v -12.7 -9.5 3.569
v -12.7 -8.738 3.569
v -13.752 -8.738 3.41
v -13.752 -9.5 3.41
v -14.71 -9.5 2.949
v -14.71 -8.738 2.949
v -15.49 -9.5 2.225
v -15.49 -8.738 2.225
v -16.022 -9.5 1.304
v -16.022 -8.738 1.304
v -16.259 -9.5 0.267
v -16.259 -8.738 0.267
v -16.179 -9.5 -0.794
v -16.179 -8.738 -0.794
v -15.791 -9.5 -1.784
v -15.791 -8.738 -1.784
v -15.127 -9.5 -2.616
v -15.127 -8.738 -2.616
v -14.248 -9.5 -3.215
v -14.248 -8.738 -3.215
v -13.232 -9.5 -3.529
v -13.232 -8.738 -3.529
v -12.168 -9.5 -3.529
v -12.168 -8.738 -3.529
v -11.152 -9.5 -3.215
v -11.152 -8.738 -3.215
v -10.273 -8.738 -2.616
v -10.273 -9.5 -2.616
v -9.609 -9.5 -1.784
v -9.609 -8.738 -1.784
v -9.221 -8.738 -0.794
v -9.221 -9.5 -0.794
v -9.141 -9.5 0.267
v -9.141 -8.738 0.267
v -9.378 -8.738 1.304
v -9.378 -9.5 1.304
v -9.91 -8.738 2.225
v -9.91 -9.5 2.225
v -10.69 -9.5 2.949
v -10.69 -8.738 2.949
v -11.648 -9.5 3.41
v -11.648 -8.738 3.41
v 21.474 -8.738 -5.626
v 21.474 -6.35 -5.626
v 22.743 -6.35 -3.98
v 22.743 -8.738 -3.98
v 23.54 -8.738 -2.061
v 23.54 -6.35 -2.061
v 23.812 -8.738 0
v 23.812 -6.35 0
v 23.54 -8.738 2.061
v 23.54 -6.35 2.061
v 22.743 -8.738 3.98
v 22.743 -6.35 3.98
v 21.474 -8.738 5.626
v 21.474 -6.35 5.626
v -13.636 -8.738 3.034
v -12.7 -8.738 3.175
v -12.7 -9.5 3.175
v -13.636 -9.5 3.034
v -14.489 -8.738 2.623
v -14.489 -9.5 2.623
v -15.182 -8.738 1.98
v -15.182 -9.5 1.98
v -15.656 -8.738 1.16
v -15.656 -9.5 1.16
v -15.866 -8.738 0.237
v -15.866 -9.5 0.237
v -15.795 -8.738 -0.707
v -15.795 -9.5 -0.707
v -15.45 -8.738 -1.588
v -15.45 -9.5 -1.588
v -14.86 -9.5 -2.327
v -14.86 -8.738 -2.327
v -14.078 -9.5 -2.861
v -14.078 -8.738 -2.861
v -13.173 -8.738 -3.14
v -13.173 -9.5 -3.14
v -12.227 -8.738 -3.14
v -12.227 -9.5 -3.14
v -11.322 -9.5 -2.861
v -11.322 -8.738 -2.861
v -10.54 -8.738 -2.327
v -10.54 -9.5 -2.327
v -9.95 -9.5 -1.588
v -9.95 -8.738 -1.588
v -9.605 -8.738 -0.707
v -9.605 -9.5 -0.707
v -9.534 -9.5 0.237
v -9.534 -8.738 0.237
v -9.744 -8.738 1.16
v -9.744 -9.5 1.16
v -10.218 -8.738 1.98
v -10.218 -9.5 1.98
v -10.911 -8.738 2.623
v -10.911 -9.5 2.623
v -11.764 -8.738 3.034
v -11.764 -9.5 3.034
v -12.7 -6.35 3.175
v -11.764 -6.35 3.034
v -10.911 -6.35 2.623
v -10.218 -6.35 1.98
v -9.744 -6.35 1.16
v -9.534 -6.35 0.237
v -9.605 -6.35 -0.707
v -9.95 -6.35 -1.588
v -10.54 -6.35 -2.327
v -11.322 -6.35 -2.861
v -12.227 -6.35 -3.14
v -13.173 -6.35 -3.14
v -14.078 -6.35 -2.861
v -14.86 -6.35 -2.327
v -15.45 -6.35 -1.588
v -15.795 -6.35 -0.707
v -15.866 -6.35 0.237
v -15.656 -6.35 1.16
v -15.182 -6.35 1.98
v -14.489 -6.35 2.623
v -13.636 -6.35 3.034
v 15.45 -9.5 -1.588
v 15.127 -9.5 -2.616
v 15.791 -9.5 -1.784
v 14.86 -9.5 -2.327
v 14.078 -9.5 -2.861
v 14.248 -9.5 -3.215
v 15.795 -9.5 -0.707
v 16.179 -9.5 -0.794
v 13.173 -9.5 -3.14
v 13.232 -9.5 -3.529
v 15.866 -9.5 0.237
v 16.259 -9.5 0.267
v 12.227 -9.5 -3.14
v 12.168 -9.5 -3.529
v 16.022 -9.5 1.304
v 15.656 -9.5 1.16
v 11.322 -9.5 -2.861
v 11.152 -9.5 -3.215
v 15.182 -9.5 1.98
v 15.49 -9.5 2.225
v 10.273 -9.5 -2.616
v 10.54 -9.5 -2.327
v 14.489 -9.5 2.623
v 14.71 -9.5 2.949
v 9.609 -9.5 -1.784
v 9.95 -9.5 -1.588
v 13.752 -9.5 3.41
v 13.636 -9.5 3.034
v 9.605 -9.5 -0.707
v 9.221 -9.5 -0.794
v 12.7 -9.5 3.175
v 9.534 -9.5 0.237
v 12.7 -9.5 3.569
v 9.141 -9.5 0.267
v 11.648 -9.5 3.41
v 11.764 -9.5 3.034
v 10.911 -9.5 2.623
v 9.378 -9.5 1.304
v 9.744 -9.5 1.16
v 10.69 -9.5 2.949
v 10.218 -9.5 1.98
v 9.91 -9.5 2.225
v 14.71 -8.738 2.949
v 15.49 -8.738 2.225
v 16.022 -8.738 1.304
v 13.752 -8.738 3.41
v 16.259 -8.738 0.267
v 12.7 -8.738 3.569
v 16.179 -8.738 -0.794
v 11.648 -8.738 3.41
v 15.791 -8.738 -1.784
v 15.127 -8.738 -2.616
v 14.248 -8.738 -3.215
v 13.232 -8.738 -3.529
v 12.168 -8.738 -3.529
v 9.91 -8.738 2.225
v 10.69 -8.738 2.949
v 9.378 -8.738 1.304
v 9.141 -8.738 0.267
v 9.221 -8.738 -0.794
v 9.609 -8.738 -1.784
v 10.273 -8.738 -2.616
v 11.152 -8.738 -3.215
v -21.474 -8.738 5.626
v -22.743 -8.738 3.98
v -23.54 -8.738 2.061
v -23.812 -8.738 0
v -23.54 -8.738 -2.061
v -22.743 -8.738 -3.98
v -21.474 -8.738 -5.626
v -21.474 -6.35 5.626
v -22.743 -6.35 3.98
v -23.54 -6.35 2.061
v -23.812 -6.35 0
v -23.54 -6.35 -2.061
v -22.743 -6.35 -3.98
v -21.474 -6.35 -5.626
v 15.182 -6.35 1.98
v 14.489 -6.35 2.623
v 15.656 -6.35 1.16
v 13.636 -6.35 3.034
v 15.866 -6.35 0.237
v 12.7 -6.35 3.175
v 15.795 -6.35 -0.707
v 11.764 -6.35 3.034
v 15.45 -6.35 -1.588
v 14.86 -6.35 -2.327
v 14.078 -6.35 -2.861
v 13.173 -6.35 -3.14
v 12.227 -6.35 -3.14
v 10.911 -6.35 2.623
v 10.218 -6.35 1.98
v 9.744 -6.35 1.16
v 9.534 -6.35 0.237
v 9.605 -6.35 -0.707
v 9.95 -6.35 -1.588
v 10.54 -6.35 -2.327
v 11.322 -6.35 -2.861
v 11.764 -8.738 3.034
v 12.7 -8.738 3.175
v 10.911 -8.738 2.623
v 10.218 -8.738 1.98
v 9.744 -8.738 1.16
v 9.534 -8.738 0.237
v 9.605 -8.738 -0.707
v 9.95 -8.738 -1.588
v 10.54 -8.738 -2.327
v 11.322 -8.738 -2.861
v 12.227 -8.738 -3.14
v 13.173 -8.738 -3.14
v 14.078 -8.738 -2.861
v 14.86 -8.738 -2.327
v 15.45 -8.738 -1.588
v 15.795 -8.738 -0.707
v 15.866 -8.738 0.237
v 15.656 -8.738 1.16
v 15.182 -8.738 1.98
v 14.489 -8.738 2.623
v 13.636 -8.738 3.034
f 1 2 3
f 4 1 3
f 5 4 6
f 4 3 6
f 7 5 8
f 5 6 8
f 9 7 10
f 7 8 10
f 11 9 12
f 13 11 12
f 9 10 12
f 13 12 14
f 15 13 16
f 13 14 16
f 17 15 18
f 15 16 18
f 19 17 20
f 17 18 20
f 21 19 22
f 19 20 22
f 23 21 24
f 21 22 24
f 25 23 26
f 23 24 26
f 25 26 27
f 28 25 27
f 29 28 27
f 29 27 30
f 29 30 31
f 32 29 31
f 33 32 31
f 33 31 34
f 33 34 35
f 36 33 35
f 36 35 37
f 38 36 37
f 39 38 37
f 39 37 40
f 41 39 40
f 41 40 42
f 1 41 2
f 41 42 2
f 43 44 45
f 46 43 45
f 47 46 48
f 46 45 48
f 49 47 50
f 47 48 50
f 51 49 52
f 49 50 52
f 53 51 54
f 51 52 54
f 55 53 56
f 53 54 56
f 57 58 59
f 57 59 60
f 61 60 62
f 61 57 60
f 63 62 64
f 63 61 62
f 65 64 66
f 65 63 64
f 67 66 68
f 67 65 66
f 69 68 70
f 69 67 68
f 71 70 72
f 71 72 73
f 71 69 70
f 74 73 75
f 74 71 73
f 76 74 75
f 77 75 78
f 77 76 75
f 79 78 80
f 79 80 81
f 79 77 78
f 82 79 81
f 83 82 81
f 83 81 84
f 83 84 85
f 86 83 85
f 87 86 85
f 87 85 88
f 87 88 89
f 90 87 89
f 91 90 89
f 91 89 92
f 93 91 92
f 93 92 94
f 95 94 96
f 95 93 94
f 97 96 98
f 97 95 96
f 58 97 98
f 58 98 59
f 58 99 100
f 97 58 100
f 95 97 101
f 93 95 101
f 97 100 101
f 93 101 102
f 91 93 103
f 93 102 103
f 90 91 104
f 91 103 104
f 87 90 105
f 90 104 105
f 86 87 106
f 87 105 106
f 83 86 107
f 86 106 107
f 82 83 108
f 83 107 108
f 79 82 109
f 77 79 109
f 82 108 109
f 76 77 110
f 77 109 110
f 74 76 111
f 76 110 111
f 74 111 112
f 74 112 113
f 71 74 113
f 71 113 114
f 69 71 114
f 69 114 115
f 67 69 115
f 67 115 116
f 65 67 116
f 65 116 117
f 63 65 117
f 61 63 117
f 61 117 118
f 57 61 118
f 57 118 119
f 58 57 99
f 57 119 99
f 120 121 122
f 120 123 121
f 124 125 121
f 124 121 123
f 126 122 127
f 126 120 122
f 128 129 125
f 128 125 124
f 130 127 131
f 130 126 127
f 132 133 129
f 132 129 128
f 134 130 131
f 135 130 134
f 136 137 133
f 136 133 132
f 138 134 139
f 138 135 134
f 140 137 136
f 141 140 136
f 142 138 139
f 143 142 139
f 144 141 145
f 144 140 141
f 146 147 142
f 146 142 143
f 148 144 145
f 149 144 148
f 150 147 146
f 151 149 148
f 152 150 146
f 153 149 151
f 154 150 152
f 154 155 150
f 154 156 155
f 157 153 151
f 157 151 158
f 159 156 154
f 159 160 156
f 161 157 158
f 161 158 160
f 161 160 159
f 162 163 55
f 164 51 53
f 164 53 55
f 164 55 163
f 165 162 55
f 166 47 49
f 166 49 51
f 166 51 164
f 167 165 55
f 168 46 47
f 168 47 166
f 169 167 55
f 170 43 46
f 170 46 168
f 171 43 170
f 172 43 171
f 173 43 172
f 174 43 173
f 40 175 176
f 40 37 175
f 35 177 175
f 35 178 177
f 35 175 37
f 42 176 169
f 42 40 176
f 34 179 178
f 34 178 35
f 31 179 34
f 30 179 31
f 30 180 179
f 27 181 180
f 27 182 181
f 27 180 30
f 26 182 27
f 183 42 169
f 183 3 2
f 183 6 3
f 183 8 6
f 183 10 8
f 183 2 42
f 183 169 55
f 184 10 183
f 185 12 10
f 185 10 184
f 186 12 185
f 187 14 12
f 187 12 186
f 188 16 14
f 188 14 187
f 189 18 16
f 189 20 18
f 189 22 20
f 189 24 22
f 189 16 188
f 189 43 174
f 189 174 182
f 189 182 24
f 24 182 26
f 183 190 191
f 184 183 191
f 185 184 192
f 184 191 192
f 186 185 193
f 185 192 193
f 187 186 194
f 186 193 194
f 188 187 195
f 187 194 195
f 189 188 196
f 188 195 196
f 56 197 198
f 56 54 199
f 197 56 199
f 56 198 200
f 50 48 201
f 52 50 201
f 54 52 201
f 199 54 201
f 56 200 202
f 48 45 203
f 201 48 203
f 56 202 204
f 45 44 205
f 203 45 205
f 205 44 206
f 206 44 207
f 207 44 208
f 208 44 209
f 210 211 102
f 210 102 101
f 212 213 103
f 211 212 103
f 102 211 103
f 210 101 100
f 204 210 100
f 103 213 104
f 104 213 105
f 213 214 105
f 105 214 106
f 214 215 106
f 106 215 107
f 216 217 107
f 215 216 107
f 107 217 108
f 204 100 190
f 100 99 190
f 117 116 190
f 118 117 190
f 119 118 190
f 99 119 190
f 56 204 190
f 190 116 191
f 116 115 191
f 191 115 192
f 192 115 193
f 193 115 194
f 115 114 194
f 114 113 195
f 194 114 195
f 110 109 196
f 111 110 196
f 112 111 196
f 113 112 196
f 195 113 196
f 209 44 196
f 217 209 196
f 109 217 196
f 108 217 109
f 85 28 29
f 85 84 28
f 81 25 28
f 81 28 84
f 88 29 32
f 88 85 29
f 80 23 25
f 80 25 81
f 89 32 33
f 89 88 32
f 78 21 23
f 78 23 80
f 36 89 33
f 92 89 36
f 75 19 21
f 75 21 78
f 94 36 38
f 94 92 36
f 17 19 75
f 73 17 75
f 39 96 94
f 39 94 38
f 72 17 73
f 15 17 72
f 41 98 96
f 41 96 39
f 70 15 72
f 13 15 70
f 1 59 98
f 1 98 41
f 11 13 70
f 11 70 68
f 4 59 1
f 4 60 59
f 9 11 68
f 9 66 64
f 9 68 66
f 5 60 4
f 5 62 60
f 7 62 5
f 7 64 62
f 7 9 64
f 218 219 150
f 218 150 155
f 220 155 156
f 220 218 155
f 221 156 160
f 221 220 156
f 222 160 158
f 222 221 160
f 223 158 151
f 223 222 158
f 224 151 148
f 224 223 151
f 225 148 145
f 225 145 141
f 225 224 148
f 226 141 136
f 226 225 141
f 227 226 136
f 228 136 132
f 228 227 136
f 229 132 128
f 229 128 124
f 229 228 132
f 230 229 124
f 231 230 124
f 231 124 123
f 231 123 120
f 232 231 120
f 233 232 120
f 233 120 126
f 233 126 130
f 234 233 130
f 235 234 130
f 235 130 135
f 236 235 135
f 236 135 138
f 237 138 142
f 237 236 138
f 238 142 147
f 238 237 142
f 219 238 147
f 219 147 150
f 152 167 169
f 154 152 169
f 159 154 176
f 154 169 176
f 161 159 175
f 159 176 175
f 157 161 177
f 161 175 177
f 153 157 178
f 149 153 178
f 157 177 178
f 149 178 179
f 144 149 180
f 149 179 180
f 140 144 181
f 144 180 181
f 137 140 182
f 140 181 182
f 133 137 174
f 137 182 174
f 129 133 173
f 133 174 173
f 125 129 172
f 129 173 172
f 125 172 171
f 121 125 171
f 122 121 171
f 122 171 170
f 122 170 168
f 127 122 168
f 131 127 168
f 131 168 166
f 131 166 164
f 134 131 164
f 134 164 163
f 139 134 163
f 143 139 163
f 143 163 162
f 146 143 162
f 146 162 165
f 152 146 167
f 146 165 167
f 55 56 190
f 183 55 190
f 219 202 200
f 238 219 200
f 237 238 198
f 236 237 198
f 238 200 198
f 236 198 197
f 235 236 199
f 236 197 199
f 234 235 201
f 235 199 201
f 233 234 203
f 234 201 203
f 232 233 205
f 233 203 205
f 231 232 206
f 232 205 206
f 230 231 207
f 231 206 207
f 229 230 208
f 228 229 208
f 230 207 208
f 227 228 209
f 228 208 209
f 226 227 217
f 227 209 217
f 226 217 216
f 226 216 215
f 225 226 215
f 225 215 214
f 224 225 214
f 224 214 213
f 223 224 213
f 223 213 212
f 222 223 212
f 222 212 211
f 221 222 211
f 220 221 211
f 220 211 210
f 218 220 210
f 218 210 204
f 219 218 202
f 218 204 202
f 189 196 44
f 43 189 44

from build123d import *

# Parameters (mm, degrees)
SKETCH1_R           = 3.175
BOSS_EXTRUDE1_DEPTH = 12.7
CUT_SWEEP1_PITCH    = 1.27
SKETCH4_OUTSIDE_W   = 14
SKETCH4_OUTSIDE_H   = 14
SKETCH4_OUTSIDE_R   = 2.21262927
CUT_EXTRUDE1_DEPTH  = 1.27
CUT_EXTRUDE1_DRAFT  = -45
CUT_EXTRUDE2_DEPTH  = 2.38125
BOSS_EXTRUDE2_START = -6.35
SKETCH8_R           = 3.175
BOSS_EXTRUDE2_DEPTH = 2.3876
SKETCH9_R           = 3.5687
SKETCH9_R_2         = 3.175
BOSS_EXTRUDE3_DEPTH = 0.762


with BuildPart() as part:
    # Sketch1 → Boss-Extrude1 (new body)
    with BuildSketch(Plane(origin=(0, 0, 0), x_dir=(1, 0, 0), z_dir=(0, 1, 0))):
        with Locations(Location((-12.7, 0, 0), (0, 0, 270))):
            Circle(SKETCH1_R)
    extrude(amount=-BOSS_EXTRUDE1_DEPTH)

    # Cut-Sweep1: the profile of Sketch3 screwed along a right-hand helix of 11 turns, 8 arcs to a turn; built about Z, then put on its axis
    cut_sweep1_z = Axis((0, 0, 0), (0, 0, 1))
    cut_sweep1_corners = [(2.350110803, 0, -0.47625), (3.243740766, 0, 0.0396875), (3.243740766, 0, -1.1509375), (2.350110803, 0, -0.635)]
    with BuildLine(mode=Mode.PRIVATE) as cut_sweep1_profile:
        Line(cut_sweep1_corners[0], cut_sweep1_corners[1])
        Line(cut_sweep1_corners[1], cut_sweep1_corners[2])
        Line(cut_sweep1_corners[2], cut_sweep1_corners[3])
        Line(cut_sweep1_corners[3], cut_sweep1_corners[0])
    cut_sweep1_cap = Face(cut_sweep1_profile.wire())
    cut_sweep1_turn_angles = [0, 22.5, 45, 67.5, 90, 112.5, 135, 157.5, 180, 202.5, 225, 247.5, 270, 292.5, 315, 337.5, 360]
    cut_sweep1_turn_weights = [1, 0.9238795325112867, 1, 0.9238795325112867, 1, 0.9238795325112867, 1, 0.9238795325112867, 1, 0.9238795325112867, 1, 0.9238795325112867, 1, 0.9238795325112867, 1, 0.9238795325112867, 1]
    cut_sweep1_turn_rails = [Edge.make_bspline([Vector(p[0], p[1], 0).rotate(cut_sweep1_z, cut_sweep1_turn_angles[k]) / cut_sweep1_turn_weights[k] + Vector(0, 0, p[2] + CUT_SWEEP1_PITCH * cut_sweep1_turn_angles[k] / 360) for k in range(17)], [0, 0, 0, 1, 1, 2, 2, 3, 3, 4, 4, 5, 5, 6, 6, 7, 7, 8, 8, 8], 2, cut_sweep1_turn_weights) for p in cut_sweep1_corners]
    cut_sweep1_turn_sides = [Face.make_surface_from_curves(cut_sweep1_turn_rails[p[0]], cut_sweep1_turn_rails[p[1]]) for p in [(0, 1), (1, 2), (2, 3), (3, 0)]]
    cut_sweep1 = Plane(origin=(-12.7, -12.7, 0), x_dir=(0, 0, -1), z_dir=(0, 1, 0)) * Solid(Shell([*[p.moved(Location((0, 0, CUT_SWEEP1_PITCH * i))) for i in range(11) for p in cut_sweep1_turn_sides], cut_sweep1_cap, cut_sweep1_cap.rotate(cut_sweep1_z, 3960).moved(Location((0, 0, CUT_SWEEP1_PITCH * 3960 / 360)))]))
    add(cut_sweep1, mode=Mode.SUBTRACT)


with BuildPart() as cut_extrude1_tool:
    # Sketch4 outside → Cut-Extrude1 (with draft: the straight prism first)
    with BuildSketch(Plane.XZ.offset(12.7)):
        with Locations((-12.7, 0)):
            Rectangle(SKETCH4_OUTSIDE_W, SKETCH4_OUTSIDE_H)
        with Locations((-12.7, 0)):
            Circle(SKETCH4_OUTSIDE_R, mode=Mode.SUBTRACT)
    extrude(amount=-CUT_EXTRUDE1_DEPTH)
    # Cut-Extrude1: the draft: its side faces are tilted about the plane it starts from
    cut_extrude1_sides = [cut_extrude1_tool.faces().sort_by_distance(p)[0] for p in [
        (-12.7, -12.065, -7),
        (-5.7, -12.065, 0),
        (-12.7, -12.065, 7),
        (-19.7, -12.065, 0),
        (-14.91262927, -12.065, 0),
    ]]
    draft(cut_extrude1_sides, Plane.XZ.offset(12.7), CUT_EXTRUDE1_DRAFT)


with BuildPart() as part_1:
    add(part.part)

    # Cut-Extrude1: cut by cut_extrude1_tool
    add(cut_extrude1_tool.part, mode=Mode.SUBTRACT)

    # Sketch5 → Revolve1 (revolve)
    with BuildSketch(Plane.XY, mode=Mode.PRIVATE) as revolve1_sk:
        with BuildLine():
            Line((-12.7, 0), (-12.7, 3.3528))
            Line((-12.7, 3.3528), (-15.875, 3.3528))
            ThreePointArc((-15.875, 3.3528), (-17.240019085, 2.263204136), (-18.2499, 0.8382))
            Line((-18.2499, 0.8382), (-19.6342, 0.8382))
            Line((-19.6342, 0.8382), (-19.6342, 0))
            Line((-19.6342, 0), (-12.7, 0))
        make_face()
    revolve(revolve1_sk.sketch.rotate(Axis((-12.7, 0, 0), (0, 1, 0)), 270), axis=Axis((-12.7, 0, 0), (0, 1, 0)))

    # Sketch6 → Cut-Extrude2 (cut)
    with BuildSketch(Plane(origin=(0, 3.3528, 0), x_dir=(1, 0, 0), z_dir=(0, 1, 0))):
        Polygon((-12.7, 2.291358881), (-14.684375, 1.14567944), (-14.684375, -1.14567944), (-12.7, -2.291358881), (-10.715625, -1.14567944), (-10.715625, 1.14567944), align=None)
    extrude(amount=-CUT_EXTRUDE2_DEPTH, mode=Mode.SUBTRACT)

    # Cut-Extrude3 cone 1 section (through the dimple's axis) → Cut-Extrude3 (revolve, cut)
    with BuildSketch(Plane(origin=(-12.7, 3.3528, 0), x_dir=(0, 0, 1), z_dir=(1, 0, 0))):
        Polygon((0, 0), (2.291358881, 0), (0, 2.291358881), align=None)
    revolve(axis=Axis((-12.7, 3.3528, 0), (0, -1, 0)), mode=Mode.SUBTRACT)


with BuildPart() as body_2:
    # Body-Move/Copy1: copy of part
    add(part_1.part.moved(Location((25.4, 0, 0))))


with BuildPart() as body_3:
    # Sketch8 → Boss-Extrude2 (new body)
    with BuildSketch(Plane(origin=(0, 0, 0), x_dir=(1, 0, 0), z_dir=(0, 1, 0)).offset(BOSS_EXTRUDE2_START)):
        with BuildLine():
            Line((-21.474187891, 5.6261), (21.474187891, 5.6261))
            ThreePointArc((21.474187891, 5.6261), (23.8125, 0), (21.474187891, -5.6261))
            Line((21.474187891, -5.6261), (-21.474187891, -5.6261))
            ThreePointArc((-21.474187891, -5.6261), (-23.8125, 0), (-21.474187891, 5.6261))
        make_face()
        with Locations(Location((-12.7, 0, 0), (0, 0, 270))):
            Circle(SKETCH8_R, mode=Mode.SUBTRACT)
        with Locations(Location((12.7, 0, 0), (0, 0, 270))):
            Circle(SKETCH8_R, mode=Mode.SUBTRACT)
    extrude(amount=-BOSS_EXTRUDE2_DEPTH)

    # Sketch9 → Boss-Extrude3 (add)
    # profile 1 of 2: a face of its own
    with BuildSketch(Plane.XZ.offset(8.7376)):
        with Locations(Location((-12.7, 0, 0), (0, 0, 90))):
            Circle(SKETCH9_R)
        with Locations(Location((-12.7, 0, 0), (0, 0, 90))):
            Circle(SKETCH9_R_2, mode=Mode.SUBTRACT)
    # profile 2 of 2: a face of its own
    with BuildSketch(Plane.XZ.offset(8.7376)):
        with Locations(Location((12.7, 0, 0), (0, 0, 90))):
            Circle(SKETCH9_R)
        with Locations(Location((12.7, 0, 0), (0, 0, 90))):
            Circle(SKETCH9_R_2, mode=Mode.SUBTRACT)
    extrude(amount=BOSS_EXTRUDE3_DEPTH)


solid = body_3.part
